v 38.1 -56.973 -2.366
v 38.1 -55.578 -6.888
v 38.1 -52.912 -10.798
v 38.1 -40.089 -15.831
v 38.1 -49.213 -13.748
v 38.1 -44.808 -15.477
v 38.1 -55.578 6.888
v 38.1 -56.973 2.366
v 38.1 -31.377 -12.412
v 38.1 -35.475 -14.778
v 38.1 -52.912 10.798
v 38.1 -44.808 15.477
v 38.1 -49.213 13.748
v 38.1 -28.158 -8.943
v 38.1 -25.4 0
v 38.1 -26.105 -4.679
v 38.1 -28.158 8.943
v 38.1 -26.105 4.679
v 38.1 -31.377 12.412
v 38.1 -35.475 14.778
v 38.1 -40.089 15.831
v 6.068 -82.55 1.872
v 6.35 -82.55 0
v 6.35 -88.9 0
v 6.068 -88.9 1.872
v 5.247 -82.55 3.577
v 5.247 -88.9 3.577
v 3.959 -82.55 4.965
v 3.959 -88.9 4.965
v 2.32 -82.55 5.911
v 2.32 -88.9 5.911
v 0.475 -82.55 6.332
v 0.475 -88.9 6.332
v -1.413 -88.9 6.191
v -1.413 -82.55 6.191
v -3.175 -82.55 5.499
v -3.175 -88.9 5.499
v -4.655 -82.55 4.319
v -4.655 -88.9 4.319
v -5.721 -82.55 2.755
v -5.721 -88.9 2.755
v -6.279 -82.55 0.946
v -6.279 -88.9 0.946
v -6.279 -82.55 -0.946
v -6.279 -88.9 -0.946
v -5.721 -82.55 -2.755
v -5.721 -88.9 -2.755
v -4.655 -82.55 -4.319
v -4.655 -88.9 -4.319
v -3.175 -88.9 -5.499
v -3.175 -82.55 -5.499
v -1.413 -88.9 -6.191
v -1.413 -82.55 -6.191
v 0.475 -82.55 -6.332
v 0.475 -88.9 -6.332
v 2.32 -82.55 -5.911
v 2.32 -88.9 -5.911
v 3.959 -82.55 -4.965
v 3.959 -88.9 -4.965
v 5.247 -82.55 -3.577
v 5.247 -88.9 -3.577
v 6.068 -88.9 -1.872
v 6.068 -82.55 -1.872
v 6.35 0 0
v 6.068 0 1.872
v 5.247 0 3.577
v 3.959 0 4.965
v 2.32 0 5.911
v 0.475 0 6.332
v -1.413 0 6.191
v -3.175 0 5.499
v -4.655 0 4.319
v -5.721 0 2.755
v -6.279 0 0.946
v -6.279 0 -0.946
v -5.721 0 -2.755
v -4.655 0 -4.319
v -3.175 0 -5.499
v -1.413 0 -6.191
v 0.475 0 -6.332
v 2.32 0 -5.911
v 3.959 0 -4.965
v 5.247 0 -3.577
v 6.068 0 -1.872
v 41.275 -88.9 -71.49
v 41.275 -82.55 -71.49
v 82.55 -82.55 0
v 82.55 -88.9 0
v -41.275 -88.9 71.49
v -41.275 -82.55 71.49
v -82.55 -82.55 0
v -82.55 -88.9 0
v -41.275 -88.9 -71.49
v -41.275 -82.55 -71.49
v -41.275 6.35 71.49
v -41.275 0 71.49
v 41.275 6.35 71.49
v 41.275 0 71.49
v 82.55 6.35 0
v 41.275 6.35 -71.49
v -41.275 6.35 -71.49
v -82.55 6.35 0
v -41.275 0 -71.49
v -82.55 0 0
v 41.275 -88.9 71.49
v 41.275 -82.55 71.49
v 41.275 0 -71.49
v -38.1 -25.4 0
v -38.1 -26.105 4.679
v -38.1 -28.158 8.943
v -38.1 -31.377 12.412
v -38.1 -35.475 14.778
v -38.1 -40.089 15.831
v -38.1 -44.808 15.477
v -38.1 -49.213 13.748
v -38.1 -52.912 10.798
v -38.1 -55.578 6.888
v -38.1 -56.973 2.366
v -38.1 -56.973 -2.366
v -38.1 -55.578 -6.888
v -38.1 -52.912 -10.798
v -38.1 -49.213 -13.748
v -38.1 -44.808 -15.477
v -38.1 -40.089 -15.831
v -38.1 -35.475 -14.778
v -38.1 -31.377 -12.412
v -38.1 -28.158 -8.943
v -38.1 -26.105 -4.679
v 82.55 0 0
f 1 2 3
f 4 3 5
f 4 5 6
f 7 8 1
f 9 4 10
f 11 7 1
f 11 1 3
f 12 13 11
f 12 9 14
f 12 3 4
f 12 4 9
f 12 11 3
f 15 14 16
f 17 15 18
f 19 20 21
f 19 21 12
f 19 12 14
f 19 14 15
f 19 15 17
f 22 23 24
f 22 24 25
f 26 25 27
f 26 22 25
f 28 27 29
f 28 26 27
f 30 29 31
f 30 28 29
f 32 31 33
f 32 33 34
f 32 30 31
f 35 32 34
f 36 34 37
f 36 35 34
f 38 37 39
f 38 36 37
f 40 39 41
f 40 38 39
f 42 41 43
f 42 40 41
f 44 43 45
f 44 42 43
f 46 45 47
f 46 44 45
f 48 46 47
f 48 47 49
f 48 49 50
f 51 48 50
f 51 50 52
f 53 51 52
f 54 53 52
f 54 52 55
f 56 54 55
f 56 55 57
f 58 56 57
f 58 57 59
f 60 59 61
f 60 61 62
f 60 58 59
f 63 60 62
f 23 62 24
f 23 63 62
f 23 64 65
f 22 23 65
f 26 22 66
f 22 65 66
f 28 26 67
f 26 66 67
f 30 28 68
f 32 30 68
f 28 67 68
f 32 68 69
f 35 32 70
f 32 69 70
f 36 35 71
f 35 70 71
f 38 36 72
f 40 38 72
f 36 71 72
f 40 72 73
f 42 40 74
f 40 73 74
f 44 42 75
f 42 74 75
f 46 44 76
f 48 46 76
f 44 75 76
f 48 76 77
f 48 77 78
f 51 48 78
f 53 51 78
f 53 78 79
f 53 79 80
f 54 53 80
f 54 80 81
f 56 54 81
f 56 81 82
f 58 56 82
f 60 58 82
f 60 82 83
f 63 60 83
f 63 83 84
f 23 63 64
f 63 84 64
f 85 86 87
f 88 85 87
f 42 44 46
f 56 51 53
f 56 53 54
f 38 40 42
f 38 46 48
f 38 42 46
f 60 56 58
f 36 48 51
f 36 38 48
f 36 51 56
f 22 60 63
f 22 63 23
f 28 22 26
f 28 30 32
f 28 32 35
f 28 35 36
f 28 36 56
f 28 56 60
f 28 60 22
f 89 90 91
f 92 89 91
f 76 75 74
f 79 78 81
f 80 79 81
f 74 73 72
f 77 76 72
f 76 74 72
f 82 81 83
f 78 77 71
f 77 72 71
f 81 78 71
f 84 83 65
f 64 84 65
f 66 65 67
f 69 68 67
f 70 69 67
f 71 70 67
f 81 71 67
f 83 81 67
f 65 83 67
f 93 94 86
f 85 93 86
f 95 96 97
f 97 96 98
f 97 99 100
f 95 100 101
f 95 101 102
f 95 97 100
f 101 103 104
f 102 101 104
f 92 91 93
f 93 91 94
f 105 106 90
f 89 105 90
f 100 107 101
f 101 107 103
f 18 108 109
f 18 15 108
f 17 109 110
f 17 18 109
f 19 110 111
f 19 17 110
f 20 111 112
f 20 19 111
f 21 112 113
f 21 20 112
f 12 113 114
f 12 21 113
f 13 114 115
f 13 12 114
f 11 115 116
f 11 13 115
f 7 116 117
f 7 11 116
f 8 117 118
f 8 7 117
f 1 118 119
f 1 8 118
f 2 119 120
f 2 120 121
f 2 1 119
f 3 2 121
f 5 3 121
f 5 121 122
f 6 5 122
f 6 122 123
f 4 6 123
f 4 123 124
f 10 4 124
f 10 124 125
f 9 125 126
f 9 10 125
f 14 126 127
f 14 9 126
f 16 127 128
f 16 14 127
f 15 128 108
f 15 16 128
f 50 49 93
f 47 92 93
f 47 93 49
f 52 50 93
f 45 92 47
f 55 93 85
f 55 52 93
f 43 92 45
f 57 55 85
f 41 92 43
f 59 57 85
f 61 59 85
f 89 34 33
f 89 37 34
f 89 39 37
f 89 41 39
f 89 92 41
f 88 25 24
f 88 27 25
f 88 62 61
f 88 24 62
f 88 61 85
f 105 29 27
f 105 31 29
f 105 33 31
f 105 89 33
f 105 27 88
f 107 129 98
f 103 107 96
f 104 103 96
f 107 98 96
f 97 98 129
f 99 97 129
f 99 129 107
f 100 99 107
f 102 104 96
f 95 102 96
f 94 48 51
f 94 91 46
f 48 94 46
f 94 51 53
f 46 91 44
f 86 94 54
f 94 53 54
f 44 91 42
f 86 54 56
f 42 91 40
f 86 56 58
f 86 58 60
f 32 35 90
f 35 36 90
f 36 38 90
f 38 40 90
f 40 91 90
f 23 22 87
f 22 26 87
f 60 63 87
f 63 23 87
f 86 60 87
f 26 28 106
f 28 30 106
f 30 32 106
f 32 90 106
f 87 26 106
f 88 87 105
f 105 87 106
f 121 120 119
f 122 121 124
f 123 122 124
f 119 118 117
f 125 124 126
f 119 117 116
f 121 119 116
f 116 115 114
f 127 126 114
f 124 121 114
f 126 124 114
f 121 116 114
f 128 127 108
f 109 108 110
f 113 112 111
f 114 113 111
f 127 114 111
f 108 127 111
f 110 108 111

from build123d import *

# Parameters (mm, degrees)
F0_R     = 6.35
F1_DEPTH = 82.55
F2_R     = 6.35
F3_DEPTH = 6.35
F5_DEPTH = 6.35
F6_R     = 15.875
F7_DEPTH = 38.1


with BuildPart() as f1:
    # F0 (on Front) → F1 (new body)
    with BuildSketch(Plane.XZ):
        Circle(F0_R)
    extrude(amount=F1_DEPTH)


with BuildPart() as f3:
    # F2 (on face) → F3 (new body)
    with BuildSketch(Plane.XZ.offset(82.55)):
        Polygon((41.275, 71.490397), (-41.275, 71.490397), (-82.55, 0), (-41.275, -71.490397), (41.275, -71.490397), (82.55, 0), align=None)
        Circle(F2_R, mode=Mode.SUBTRACT)
    extrude(amount=F3_DEPTH)


with BuildPart() as f5:
    # F4 (on face) → F5 (new body)
    with BuildSketch(Plane(origin=(0, 0, 0), x_dir=(-1, 0, 0), z_dir=(0, 1, 0))):
        Polygon((82.55, 0), (41.275, 71.490397), (-41.275, 71.490397), (-82.55, 0), (-41.275, -71.490397), (41.275, -71.490397), align=None)
    extrude(amount=F5_DEPTH)


with BuildPart() as f7:
    # F6 (on Right) → F7 (new body, symmetric)
    with BuildSketch(Plane.YZ):
        with Locations((-41.275, 0)):
            Circle(F6_R)
    extrude(amount=F7_DEPTH, both=True)


solid = Compound([f1.part, f3.part, f5.part, f7.part])
